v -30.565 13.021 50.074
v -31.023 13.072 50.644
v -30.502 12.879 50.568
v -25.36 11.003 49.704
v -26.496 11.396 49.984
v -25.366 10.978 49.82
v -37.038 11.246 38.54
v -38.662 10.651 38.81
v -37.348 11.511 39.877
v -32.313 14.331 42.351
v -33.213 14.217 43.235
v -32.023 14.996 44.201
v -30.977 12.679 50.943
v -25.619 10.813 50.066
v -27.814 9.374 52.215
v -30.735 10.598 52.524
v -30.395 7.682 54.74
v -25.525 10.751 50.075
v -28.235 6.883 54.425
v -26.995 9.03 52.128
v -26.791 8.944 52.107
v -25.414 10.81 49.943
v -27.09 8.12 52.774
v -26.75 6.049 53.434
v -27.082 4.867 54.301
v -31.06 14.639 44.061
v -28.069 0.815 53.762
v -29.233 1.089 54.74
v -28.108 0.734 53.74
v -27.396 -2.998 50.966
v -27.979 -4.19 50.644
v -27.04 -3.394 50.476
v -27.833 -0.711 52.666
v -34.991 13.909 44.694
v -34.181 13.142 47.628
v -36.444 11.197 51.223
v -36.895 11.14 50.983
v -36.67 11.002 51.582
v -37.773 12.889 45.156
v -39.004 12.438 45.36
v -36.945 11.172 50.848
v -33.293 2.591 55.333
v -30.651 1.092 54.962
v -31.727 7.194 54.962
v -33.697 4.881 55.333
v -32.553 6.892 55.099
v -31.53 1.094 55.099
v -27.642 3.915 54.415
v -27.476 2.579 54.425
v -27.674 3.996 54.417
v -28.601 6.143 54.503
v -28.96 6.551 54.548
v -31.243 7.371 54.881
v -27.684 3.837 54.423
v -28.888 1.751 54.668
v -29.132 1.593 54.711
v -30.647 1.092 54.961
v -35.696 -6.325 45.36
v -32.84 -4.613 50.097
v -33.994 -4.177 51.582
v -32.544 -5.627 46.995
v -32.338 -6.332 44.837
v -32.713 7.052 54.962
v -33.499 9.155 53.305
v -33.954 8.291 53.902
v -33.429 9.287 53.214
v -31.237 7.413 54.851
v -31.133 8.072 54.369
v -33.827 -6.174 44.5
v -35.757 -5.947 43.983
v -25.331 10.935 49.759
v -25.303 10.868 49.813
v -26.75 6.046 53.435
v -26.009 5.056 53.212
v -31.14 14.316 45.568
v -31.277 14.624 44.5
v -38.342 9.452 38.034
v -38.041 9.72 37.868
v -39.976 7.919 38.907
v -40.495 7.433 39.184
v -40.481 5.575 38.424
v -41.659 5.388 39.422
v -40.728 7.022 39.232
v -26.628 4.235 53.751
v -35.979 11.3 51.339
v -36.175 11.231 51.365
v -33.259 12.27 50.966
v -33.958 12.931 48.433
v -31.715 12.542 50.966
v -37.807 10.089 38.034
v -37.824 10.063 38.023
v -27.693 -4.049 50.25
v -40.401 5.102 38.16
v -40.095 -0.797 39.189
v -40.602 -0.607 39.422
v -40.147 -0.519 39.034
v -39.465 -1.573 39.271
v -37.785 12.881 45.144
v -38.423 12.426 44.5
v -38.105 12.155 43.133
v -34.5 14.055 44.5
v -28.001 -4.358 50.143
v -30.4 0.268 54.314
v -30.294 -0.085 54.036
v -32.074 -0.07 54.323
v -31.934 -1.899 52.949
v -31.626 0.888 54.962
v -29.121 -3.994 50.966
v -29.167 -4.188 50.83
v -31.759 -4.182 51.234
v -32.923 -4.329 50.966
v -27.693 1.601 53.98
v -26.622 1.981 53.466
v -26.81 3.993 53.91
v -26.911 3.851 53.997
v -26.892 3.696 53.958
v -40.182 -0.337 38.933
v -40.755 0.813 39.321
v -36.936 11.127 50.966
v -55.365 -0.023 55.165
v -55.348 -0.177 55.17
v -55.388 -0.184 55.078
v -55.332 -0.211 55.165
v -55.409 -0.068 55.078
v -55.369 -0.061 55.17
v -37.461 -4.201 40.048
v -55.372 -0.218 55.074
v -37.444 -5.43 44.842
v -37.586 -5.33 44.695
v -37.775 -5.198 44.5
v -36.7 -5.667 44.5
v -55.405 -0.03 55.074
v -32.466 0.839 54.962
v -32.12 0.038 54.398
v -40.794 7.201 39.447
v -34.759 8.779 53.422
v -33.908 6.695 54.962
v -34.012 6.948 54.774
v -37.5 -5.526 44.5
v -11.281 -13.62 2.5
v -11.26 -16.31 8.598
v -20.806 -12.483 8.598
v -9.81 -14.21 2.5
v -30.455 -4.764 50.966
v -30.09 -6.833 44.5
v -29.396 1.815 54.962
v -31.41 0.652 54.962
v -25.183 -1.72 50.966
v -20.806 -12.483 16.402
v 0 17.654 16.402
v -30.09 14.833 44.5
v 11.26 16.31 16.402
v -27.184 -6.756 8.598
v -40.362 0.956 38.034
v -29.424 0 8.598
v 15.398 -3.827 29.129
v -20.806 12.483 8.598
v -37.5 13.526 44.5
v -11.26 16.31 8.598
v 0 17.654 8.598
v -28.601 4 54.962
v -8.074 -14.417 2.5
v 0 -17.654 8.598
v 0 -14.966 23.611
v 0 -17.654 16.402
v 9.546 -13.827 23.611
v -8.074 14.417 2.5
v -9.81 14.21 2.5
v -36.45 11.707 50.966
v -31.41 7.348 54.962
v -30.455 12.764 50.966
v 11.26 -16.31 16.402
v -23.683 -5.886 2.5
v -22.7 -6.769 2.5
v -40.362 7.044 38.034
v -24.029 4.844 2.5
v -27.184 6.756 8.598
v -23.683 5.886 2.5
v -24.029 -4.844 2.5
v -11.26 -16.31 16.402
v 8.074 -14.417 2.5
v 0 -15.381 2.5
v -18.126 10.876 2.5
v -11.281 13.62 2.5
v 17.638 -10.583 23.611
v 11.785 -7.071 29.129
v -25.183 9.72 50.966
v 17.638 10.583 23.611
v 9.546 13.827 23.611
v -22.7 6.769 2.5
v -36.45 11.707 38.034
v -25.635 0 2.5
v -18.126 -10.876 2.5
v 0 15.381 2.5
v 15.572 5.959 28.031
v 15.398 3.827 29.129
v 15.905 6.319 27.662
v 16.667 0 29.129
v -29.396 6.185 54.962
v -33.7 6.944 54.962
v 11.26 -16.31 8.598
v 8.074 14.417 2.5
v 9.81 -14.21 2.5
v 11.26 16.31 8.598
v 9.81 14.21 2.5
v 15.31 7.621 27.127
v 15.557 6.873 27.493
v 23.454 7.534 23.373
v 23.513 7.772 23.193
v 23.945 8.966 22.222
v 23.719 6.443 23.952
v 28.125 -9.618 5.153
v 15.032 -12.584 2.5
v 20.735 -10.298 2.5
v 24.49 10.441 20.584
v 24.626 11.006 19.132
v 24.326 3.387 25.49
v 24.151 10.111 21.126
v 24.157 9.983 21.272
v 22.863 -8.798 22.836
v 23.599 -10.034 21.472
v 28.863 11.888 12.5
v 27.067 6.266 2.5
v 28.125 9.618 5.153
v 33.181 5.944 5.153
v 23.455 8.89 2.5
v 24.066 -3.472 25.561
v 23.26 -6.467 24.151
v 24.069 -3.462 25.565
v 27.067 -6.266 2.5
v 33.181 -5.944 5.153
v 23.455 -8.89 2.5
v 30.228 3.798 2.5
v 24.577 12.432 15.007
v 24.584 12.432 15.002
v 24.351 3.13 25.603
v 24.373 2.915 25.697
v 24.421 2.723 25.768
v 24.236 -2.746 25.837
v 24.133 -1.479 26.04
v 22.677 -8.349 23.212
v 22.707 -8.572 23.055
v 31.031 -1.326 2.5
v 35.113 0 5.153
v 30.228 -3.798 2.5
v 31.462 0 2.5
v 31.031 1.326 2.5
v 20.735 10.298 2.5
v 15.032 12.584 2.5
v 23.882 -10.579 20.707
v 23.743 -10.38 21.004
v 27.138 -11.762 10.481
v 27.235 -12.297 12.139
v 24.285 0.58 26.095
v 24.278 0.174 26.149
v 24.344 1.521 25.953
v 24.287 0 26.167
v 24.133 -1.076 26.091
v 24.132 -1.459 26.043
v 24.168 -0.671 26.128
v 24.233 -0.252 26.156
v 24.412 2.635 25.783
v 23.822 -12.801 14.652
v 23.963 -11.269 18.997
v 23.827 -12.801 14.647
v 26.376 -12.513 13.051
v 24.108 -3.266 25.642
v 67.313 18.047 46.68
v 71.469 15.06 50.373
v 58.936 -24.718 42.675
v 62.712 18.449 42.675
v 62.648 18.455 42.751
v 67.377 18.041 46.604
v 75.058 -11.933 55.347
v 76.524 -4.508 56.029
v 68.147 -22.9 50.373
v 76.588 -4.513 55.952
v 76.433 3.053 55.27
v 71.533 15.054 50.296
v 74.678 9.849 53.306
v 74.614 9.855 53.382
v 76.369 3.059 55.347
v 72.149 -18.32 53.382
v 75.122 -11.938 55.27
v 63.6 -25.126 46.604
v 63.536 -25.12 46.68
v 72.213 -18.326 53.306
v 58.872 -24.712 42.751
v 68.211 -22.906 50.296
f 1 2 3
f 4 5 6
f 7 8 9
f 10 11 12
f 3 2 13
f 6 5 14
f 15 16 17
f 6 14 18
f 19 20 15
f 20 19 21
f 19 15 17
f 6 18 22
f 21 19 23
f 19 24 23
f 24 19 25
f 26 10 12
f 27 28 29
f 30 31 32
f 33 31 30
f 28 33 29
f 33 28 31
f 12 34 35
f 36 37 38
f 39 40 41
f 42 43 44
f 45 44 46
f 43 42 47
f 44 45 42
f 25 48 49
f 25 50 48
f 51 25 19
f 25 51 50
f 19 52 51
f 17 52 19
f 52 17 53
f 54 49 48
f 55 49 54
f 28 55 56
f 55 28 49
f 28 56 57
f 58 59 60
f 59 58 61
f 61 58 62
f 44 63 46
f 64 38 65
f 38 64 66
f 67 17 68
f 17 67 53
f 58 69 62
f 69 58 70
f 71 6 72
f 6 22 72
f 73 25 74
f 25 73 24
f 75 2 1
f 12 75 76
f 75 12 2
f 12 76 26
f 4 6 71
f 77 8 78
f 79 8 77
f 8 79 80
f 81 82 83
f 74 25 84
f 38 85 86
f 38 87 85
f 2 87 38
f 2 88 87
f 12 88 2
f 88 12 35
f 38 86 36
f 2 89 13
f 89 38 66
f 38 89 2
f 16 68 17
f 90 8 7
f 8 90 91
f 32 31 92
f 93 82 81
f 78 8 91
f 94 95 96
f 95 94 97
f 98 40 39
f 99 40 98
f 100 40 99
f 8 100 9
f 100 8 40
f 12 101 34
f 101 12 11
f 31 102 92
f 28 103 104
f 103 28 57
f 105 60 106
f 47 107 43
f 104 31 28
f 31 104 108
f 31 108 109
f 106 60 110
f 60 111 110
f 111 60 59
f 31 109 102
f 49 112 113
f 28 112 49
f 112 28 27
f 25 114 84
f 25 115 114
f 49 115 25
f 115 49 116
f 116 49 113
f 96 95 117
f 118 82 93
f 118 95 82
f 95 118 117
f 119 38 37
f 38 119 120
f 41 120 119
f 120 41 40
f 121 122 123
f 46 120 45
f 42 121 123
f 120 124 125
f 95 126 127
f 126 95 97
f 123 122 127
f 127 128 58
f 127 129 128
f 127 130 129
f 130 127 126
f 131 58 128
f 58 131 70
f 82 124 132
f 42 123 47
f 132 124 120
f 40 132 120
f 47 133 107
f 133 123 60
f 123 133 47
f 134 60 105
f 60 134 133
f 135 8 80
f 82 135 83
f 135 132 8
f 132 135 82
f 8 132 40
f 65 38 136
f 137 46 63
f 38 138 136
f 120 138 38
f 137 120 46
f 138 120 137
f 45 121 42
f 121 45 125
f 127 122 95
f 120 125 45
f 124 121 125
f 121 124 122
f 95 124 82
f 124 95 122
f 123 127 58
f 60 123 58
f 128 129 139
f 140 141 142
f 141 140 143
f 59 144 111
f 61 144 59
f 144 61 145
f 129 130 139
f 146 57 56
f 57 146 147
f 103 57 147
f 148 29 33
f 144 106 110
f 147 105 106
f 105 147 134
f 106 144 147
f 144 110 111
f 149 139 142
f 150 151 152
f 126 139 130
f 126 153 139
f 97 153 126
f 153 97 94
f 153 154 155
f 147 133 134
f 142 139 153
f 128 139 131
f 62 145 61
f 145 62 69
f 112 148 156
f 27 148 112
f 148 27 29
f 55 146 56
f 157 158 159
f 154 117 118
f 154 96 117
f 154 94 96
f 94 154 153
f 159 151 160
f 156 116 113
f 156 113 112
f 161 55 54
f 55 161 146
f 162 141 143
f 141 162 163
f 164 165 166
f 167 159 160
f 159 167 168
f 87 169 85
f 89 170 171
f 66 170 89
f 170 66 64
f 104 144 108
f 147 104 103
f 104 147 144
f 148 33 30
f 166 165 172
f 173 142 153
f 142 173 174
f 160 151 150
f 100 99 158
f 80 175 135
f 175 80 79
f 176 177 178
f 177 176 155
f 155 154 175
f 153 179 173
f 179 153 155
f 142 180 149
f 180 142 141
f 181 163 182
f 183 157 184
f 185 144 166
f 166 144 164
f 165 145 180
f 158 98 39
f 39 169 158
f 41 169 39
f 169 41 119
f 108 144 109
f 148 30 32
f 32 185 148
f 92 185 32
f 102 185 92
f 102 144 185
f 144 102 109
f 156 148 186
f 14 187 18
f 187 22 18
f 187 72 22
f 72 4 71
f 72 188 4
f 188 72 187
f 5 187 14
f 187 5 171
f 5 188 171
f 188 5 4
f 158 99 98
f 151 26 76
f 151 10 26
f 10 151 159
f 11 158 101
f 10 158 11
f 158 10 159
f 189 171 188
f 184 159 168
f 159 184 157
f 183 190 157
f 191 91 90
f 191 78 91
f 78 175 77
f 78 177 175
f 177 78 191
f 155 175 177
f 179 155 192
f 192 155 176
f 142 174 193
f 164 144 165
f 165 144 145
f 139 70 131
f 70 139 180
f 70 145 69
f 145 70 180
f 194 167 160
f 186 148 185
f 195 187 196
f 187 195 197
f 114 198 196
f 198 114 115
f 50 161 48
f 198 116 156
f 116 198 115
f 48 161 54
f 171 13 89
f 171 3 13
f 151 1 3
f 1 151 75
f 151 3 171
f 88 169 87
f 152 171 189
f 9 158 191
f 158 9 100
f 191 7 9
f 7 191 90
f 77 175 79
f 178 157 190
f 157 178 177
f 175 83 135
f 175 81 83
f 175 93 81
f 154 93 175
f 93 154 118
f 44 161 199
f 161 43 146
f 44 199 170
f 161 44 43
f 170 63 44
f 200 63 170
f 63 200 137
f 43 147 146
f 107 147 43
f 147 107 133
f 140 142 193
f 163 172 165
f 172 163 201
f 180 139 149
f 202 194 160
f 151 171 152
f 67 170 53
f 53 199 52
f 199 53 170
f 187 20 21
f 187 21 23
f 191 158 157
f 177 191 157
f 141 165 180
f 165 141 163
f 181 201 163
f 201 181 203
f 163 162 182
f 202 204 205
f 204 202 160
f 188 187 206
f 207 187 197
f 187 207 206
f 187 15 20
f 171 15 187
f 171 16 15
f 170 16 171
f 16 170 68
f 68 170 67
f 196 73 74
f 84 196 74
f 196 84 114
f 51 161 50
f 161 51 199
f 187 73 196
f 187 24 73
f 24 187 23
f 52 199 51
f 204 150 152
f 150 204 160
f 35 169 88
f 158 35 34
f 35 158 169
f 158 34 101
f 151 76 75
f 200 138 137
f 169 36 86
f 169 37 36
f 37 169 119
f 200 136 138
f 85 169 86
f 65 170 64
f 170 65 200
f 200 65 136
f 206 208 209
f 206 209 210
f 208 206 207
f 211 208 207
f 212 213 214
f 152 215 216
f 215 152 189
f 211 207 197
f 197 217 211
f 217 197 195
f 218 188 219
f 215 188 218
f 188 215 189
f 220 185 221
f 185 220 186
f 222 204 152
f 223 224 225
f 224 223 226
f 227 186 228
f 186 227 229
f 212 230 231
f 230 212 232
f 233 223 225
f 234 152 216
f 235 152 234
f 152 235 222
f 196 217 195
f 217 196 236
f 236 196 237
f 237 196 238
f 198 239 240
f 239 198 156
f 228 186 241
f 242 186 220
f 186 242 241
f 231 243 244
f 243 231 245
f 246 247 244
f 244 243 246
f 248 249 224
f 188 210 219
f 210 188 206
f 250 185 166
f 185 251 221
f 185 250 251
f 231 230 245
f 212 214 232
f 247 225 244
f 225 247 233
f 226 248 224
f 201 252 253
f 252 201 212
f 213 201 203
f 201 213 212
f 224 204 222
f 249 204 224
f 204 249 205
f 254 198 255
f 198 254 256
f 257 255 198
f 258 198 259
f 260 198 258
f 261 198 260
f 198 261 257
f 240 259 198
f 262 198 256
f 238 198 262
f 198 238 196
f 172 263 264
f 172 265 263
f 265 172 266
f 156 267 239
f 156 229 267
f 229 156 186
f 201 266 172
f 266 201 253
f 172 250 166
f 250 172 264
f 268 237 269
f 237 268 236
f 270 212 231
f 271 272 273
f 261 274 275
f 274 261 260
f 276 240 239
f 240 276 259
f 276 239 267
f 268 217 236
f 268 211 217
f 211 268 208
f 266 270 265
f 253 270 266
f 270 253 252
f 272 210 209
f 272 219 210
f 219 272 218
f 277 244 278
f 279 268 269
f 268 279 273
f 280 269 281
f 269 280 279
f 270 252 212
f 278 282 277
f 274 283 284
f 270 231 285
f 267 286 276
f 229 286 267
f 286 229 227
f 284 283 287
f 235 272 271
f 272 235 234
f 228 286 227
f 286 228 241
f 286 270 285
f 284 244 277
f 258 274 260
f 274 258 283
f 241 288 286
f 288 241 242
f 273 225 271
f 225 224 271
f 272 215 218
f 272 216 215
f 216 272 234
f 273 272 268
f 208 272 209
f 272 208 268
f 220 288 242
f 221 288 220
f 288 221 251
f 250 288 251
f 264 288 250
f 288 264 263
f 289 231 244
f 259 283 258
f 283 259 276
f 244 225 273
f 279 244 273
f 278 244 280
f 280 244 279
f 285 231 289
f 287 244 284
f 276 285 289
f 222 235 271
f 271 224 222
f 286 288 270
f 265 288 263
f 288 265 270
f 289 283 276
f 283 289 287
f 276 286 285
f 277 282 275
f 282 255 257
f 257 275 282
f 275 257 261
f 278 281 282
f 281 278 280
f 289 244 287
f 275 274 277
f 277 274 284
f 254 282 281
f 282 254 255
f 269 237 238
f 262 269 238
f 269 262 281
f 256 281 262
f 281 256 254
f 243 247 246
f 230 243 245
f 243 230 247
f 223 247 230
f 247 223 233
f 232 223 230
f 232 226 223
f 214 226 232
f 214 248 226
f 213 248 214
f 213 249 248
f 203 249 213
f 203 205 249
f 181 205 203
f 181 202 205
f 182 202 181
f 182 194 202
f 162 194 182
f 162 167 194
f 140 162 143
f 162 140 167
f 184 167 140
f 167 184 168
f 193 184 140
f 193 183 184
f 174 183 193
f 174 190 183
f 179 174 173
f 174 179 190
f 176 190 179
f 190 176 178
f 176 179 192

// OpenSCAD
// Better use "fast" when tuning your bird, then "hi" to print it
precision="low"; // [low,med,hi]

// Length of the beak
beak_length= 15; // [0:50]
// Ratio relative to the head size
beak_size= 100; // [20:100]
// Width of the beak tip (0 is pointy)
beak_width= 0; // [0:25]
// Shape of the beak tip (lowest is flat)
beak_roundness= 10; // [10:200]

// Head diameter
head_size=22; // [10:40]
// Horizontal distance from head to main body
head_to_belly=32; // [-20:50]
// Size of the eyes
eye_size=0; // [0:20]
// Head lateral offset
head_lateral_offset=4; // [-15:15]
// Head vertical height
head_level=32; // [0:80]
// Head horizontal rotation
head_yaw=10; // [-45:45]
// Head vertical rotation (positive is upwards)
head_pitch=9; // [-80:45]

// How long is the front body
belly_length=60; // [10:100]
// Belly section size
belly_size=40; // [20:60]
// Additional fatness ratio
belly_fat=90; // [50:150]

// Distance from main body center to bottom center
belly_to_bottom=25; // [1:50]
// Bottom diameter
bottom_size=25; // [5:50]

// Tail length
tail_length= 50; //[0:100]
// How large is the tail
tail_width= 22; // [1:50]
// Tail horizontal rotation
tail_yaw=-5; // [-45:45]
// Tail vertical angle (positive is upwards)
tail_pitch=40; // [-45:90]
// How round is the tail (lowest is flat)
tail_roundness=80; // [10:200]

// How to cut the base of the object (-1 to disable, then use your own slicer options)
base_flat= 50; // [-100:100]

$fa= ( precision=="low" ? 10 : ( precision=="med" ? 5 : 3) );
$fs= ( precision=="low" ? 8 : ( precision=="med" ? 3 : 1.8) );
total_len= beak_length+head_to_belly+belly_to_bottom+tail_length;

module chained_hull()
{
	for(i=[0:$children-2])
		hull()
			for(j=[i,i+1])
				child(j);
}

module skull()
{
	sphere(r=head_size/2);
}

module head()
{
	skull();
	if(eye_size>1)
		for(y=[-1,+1])
			scale([1,y,1])
				rotate([50,-40,0])
					translate([0,0,head_size/2-eye_size/8])
						scale([1,1,0.5])
							sphere(r=eye_size/2, $fs=1);

	scale([1, beak_size/100, beak_size/100])
		hull()
		{
			skull();
			rotate([0,15,0])
				translate([-beak_length-head_size/2,0,0])
					scale([beak_roundness/100,1,1])
						cylinder(r=beak_width?beak_width:0.1,h=0.1); // nose
		}
}

translate([0,0,bottom_size/2])
difference()
{
	translate([-head_to_belly,0,0])
	union()
	{
		translate([0,head_lateral_offset,head_level])
			rotate([0,head_pitch,head_yaw])
				head();

		chained_hull()
		{
			translate([0,head_lateral_offset,head_level])
				sphere(r=head_size/2);

			translate([head_to_belly,0,0])
				scale([belly_length/belly_size,belly_fat/100,1])
					sphere(r=belly_size/2);

			translate([head_to_belly+belly_to_bottom,0,0])
					sphere(r=bottom_size/2);

			if(tail_length && tail_width && tail_roundness)
			translate([head_to_belly+belly_to_bottom,0,0])
				rotate([0,-tail_pitch,tail_yaw])
					translate([tail_length,0,0])
						scale([tail_roundness/100,1,1])
							cylinder(r=tail_width,h=0.1);
		}
	}
	if(base_flat!=-100)
		translate([-total_len*5,-total_len*5,belly_size*(-1.5 + base_flat/200) ])
			cube([total_len*10,total_len*10,belly_size]);
}
